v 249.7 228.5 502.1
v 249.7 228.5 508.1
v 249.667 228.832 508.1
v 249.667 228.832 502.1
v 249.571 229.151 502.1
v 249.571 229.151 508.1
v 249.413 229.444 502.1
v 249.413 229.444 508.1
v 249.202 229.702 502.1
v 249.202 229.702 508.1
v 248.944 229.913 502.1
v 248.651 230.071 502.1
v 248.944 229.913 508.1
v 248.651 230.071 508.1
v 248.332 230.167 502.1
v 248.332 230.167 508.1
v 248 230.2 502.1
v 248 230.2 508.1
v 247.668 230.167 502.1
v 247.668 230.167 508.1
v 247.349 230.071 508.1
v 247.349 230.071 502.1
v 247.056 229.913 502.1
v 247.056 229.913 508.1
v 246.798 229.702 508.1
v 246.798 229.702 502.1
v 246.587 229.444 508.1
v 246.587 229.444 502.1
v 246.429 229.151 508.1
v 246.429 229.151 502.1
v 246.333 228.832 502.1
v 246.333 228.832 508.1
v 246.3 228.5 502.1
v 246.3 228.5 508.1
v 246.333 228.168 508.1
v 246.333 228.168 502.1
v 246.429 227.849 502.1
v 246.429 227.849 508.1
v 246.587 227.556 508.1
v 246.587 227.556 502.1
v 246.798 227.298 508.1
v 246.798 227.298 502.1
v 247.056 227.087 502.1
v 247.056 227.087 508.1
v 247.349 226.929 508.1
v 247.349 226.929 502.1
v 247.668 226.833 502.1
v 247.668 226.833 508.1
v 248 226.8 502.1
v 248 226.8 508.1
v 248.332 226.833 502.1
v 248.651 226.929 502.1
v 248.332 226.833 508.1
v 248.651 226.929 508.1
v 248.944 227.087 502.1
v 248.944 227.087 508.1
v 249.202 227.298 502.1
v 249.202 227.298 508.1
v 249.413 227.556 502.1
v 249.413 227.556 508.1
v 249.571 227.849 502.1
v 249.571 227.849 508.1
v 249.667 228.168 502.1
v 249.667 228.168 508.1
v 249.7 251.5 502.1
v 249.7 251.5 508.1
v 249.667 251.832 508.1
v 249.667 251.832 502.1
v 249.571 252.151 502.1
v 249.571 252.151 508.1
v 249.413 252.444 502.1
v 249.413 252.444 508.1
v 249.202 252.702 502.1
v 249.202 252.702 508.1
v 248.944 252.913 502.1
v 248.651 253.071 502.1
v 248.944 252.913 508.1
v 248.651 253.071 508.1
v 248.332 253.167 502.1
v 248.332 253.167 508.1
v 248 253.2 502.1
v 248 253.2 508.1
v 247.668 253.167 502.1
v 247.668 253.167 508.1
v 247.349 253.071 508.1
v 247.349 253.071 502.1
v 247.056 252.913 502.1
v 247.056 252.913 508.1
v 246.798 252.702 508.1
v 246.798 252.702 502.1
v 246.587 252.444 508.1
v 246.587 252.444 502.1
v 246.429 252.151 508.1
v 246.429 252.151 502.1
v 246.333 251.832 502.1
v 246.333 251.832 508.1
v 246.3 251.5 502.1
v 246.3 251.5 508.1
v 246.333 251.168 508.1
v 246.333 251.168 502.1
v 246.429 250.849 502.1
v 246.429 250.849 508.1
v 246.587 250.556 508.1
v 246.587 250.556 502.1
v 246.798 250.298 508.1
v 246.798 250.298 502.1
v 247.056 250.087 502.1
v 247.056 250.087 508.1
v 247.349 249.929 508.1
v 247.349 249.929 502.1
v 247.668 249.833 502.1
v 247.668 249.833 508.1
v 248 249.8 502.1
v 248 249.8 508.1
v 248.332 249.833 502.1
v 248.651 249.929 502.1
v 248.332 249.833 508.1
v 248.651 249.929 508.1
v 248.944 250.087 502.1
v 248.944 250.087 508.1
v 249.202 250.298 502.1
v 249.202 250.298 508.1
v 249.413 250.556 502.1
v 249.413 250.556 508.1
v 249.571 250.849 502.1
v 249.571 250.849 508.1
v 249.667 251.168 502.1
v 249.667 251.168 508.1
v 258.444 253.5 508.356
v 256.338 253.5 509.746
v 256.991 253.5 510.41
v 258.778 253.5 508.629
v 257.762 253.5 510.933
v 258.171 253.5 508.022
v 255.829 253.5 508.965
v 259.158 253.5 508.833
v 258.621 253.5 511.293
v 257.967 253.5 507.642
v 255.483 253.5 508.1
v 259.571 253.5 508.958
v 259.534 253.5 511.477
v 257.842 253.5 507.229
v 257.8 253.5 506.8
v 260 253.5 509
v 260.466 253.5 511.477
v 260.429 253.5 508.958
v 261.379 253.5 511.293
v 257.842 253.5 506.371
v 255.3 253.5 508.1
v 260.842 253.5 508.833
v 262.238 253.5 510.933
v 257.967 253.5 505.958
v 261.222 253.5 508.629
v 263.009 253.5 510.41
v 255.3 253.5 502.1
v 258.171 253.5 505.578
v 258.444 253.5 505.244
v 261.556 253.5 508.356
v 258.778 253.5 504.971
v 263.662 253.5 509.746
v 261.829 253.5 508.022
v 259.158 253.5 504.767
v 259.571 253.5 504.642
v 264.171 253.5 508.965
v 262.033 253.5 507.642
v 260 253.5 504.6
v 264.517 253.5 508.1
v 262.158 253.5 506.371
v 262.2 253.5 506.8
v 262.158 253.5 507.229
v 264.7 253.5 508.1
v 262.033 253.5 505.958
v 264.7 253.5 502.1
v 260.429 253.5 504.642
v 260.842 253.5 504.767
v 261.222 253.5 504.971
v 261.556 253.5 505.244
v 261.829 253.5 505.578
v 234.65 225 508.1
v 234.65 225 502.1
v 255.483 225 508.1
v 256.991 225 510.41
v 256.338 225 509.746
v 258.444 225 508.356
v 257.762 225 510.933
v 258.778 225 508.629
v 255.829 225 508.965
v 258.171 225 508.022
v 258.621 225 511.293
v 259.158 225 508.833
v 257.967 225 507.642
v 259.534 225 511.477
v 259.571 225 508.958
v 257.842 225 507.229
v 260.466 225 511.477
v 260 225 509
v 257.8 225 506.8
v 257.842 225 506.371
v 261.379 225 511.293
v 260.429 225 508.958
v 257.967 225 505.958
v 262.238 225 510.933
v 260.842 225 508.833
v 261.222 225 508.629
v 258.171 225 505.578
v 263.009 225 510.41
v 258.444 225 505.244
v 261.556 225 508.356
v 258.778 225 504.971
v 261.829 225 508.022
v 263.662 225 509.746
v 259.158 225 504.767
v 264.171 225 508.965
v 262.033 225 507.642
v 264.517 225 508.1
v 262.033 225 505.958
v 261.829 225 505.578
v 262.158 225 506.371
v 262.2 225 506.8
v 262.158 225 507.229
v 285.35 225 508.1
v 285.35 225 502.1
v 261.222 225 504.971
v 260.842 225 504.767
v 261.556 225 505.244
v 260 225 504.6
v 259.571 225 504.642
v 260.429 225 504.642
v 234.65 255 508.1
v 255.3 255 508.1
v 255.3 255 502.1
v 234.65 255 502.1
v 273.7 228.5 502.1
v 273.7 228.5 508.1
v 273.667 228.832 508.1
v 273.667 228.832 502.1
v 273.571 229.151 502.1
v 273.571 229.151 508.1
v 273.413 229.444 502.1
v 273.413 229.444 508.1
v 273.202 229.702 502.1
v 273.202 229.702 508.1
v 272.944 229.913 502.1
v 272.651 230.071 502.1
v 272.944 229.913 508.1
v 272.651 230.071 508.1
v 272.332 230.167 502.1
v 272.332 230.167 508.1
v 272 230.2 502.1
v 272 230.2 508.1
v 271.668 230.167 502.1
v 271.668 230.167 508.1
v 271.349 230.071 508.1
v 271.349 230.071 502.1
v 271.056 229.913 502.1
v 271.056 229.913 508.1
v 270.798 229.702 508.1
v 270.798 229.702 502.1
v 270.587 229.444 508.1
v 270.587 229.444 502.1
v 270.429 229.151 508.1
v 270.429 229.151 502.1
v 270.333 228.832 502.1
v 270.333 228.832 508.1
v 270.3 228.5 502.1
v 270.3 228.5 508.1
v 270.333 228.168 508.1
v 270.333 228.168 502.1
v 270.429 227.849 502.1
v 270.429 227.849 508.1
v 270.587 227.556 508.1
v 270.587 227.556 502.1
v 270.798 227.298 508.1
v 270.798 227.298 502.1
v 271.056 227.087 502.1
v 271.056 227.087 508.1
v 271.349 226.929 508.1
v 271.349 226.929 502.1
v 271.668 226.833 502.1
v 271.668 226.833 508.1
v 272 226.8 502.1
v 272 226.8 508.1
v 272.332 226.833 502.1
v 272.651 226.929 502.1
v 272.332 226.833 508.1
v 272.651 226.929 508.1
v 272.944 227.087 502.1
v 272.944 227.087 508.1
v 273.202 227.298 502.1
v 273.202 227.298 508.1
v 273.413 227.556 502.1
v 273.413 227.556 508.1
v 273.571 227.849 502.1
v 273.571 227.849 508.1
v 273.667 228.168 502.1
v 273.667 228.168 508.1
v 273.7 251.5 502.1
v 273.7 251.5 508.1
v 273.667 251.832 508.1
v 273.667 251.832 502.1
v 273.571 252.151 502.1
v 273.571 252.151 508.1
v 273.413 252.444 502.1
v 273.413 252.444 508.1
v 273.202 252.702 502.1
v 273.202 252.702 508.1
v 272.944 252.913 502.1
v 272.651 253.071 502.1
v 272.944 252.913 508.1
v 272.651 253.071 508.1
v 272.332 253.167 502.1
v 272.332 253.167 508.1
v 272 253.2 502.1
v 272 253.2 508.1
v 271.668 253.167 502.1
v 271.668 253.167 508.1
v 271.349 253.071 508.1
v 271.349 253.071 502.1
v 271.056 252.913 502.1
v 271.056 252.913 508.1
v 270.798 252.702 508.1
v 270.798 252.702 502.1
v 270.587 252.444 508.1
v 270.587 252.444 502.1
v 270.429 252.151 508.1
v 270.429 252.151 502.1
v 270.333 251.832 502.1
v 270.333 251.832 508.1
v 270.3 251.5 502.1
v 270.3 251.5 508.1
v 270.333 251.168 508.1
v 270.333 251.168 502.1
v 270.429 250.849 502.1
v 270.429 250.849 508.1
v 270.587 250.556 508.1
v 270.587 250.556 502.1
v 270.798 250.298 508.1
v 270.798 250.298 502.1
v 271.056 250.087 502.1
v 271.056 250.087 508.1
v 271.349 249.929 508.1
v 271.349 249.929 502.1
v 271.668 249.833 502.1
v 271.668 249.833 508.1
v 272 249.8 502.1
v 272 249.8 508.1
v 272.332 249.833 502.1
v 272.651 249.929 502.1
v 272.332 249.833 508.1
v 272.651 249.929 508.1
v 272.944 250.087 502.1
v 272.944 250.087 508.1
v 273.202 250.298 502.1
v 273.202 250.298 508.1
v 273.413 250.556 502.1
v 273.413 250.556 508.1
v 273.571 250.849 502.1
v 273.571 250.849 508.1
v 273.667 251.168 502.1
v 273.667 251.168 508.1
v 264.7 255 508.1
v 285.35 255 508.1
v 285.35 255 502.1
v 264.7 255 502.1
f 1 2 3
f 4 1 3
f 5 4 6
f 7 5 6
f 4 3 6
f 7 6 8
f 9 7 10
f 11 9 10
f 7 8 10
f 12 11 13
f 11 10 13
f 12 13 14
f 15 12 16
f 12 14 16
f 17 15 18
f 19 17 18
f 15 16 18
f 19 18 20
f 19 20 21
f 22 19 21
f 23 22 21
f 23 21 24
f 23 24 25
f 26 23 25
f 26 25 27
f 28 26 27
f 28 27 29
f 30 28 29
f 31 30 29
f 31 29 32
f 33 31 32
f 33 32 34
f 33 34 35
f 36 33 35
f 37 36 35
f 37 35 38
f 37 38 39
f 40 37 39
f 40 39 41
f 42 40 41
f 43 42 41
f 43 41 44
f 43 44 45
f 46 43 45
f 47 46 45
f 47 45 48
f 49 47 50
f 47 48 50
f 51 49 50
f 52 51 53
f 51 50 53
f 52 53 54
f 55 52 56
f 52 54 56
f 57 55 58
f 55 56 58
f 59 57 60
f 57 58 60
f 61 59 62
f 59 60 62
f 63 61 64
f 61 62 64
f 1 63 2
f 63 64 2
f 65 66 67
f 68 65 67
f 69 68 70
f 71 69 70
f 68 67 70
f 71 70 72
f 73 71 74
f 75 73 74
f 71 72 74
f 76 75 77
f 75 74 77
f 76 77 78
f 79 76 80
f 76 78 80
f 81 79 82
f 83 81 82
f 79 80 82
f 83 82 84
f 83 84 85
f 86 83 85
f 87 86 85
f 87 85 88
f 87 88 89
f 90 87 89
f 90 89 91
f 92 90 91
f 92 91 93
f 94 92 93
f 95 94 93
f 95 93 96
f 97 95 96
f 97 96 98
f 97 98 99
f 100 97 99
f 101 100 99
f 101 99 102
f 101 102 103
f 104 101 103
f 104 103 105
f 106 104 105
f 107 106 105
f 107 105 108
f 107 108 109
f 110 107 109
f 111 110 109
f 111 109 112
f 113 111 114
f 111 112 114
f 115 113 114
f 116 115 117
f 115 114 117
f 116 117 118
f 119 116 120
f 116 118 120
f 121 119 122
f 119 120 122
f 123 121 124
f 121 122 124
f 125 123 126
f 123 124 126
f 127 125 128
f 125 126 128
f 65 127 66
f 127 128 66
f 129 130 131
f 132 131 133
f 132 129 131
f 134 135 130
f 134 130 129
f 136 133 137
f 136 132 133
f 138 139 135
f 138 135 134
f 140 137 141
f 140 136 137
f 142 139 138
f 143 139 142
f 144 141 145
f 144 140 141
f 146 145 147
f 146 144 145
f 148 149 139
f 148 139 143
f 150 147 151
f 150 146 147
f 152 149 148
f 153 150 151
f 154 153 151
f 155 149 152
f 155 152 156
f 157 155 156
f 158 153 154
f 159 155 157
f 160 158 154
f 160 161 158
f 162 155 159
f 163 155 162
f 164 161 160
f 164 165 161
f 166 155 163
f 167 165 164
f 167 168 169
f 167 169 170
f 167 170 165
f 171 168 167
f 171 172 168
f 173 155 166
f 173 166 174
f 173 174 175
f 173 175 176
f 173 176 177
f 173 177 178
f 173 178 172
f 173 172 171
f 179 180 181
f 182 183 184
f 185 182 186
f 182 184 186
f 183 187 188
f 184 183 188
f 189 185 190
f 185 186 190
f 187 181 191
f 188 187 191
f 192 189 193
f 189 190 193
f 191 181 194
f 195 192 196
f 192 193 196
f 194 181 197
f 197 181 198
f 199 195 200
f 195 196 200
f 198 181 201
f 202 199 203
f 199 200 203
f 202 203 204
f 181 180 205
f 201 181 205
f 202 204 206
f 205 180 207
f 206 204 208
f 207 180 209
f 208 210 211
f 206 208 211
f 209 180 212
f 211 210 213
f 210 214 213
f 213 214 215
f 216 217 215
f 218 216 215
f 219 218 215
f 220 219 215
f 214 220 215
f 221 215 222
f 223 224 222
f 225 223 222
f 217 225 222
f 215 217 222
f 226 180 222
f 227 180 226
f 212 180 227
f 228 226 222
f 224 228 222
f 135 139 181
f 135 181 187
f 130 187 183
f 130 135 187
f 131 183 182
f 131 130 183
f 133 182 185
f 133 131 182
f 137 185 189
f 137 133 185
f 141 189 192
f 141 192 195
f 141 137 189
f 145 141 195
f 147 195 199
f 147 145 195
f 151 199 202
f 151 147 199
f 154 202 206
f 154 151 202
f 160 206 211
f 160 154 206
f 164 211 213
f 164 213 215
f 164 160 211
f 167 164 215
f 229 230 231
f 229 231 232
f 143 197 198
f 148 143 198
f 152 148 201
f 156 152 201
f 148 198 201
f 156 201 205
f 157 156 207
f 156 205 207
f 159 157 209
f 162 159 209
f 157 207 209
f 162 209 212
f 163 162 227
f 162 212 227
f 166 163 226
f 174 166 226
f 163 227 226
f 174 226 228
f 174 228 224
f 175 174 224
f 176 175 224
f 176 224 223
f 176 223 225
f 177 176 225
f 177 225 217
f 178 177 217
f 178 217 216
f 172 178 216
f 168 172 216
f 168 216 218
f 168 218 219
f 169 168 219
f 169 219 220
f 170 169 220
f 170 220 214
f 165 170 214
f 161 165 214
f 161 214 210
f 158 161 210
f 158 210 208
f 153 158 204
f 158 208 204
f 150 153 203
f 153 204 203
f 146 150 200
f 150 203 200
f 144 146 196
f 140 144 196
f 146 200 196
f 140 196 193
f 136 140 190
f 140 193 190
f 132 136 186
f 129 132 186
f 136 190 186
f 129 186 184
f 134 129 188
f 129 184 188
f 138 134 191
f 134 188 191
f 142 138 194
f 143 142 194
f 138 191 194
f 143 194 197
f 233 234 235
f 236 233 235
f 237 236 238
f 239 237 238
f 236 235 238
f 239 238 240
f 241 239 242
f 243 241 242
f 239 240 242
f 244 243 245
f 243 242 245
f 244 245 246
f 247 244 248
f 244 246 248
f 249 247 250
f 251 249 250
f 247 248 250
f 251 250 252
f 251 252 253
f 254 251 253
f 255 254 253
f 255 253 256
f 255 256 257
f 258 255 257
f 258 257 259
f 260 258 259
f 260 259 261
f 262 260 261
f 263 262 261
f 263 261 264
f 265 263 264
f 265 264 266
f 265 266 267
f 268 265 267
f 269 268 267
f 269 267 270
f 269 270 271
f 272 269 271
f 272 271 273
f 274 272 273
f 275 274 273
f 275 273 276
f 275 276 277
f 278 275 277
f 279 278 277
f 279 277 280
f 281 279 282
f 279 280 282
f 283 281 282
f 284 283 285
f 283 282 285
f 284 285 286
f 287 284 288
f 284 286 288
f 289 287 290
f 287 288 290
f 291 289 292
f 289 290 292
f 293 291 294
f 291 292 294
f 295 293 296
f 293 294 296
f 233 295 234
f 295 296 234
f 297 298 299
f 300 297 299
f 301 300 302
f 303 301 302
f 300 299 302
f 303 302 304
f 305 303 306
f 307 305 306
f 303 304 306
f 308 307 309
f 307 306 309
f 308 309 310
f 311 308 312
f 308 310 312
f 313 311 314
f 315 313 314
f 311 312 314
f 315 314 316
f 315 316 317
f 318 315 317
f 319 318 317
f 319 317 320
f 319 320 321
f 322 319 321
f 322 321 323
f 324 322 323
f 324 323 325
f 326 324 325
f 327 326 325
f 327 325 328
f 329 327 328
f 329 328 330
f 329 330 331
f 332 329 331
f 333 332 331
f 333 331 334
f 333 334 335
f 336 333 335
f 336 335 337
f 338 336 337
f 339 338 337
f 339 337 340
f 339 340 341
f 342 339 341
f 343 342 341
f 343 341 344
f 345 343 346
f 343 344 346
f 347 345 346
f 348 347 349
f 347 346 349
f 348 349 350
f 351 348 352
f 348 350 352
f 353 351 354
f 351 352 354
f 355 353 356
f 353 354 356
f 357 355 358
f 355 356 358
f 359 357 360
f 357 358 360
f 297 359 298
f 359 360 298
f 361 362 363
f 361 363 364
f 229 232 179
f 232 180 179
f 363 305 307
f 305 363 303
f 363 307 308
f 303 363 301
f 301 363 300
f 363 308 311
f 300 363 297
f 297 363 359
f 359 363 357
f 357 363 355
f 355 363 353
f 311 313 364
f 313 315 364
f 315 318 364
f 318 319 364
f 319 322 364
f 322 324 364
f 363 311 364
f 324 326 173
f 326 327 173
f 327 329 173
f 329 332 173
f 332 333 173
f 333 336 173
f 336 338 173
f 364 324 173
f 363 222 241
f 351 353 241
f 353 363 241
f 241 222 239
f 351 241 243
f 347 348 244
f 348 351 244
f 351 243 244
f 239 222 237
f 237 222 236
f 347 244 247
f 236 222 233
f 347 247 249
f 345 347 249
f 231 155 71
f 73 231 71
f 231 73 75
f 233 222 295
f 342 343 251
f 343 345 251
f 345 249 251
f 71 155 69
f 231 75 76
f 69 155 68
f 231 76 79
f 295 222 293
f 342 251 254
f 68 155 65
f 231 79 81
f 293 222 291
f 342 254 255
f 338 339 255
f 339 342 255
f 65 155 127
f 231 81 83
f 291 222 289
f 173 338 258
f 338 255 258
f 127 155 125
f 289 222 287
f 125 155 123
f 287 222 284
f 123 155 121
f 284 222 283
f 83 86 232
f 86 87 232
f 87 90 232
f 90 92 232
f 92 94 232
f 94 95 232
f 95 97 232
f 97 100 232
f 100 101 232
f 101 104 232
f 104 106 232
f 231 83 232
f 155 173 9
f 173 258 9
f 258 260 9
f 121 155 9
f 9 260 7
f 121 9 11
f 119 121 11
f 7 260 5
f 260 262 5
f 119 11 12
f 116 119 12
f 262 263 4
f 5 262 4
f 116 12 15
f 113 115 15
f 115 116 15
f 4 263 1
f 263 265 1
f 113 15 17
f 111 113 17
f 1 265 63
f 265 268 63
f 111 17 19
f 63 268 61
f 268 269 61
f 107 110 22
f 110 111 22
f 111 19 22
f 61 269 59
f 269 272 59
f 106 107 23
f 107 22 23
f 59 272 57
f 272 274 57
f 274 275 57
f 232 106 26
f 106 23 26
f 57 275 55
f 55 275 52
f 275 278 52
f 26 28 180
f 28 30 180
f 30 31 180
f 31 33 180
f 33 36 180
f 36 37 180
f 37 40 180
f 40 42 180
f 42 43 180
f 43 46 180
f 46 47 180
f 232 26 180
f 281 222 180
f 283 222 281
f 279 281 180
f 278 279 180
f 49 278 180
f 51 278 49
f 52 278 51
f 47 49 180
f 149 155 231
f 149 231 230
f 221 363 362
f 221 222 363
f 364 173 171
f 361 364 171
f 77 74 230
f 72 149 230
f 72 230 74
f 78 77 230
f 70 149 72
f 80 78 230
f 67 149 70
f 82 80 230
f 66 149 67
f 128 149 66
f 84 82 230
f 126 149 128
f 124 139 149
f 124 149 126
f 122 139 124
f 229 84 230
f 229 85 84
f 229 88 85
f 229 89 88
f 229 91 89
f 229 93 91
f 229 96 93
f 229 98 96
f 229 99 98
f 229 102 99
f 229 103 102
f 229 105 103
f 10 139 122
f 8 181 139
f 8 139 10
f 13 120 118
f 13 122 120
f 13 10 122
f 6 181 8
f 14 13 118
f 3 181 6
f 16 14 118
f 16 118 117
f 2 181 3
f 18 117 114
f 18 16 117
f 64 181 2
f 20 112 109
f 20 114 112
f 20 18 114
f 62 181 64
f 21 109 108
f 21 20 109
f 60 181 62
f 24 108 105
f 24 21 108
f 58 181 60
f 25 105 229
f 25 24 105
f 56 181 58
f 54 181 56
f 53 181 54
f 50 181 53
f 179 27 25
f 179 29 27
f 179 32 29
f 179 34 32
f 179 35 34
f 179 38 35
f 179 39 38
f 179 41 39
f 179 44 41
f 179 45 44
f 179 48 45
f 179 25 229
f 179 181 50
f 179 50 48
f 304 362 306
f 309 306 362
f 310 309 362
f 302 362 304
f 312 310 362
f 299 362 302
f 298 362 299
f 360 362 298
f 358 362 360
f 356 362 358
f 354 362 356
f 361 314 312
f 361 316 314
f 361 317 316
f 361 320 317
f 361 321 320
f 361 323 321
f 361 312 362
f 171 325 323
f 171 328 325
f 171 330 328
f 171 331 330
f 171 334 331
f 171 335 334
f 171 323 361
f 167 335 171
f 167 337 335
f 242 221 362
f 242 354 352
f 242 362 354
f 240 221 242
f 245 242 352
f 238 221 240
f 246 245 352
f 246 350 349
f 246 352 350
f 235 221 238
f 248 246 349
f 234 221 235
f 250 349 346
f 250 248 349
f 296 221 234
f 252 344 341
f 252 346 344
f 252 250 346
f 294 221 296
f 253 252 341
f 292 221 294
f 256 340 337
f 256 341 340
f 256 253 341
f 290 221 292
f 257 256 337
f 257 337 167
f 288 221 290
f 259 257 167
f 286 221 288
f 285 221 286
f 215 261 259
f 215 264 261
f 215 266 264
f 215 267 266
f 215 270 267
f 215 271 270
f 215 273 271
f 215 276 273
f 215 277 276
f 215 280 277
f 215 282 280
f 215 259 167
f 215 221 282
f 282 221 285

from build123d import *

# Parameters (mm, degrees)
EXTRUDE_1_DEPTH             = 28.5
SKETCH_2_W                  = 20.65
SKETCH_2_H                  = 6
EXTRUDE_2_DEPTH             = 1.5
SKETCH_3_W                  = 20.65
SKETCH_3_H                  = 6
EXTRUDE_3_DEPTH             = 1.5
HOLE_WIZARD_4_4_4_4_1_D     = 4.4
HOLE_WIZARD_4_4_4_4_1_DEPTH = 28.5
HOLE_WIZARD_3_4_3_4_1_D     = 3.4
HOLE_WIZARD_3_4_3_4_1_DEPTH = 9.4


with BuildPart() as part:
    # 草图1 → 凸台-拉伸1 (new body)
    with BuildSketch(Plane(origin=(0, 253.5, 0), x_dir=(1, 0, 0), z_dir=(0, 1, 0))):
        with BuildLine():
            Line((264.516635916, -508.1), (285.35, -508.1))
            Line((285.35, -508.1), (285.35, -502.1))
            Line((285.35, -502.1), (234.65, -502.1))
            Line((234.65, -502.1), (234.65, -508.1))
            Line((234.65, -508.1), (255.483364084, -508.1))
            ThreePointArc((255.483364084, -508.1), (260, -511.5), (264.516635916, -508.1))
        make_face()
    extrude(amount=-EXTRUDE_1_DEPTH)

    # 草图2 → 凸台-拉伸2 (add)
    with BuildSketch(Plane(origin=(0, 253.5, 0), x_dir=(-1, 0, 0), z_dir=(0, 1, 0))):
        with Locations((-275.025, 505.1)):
            Rectangle(SKETCH_2_W, SKETCH_2_H)
    extrude(amount=EXTRUDE_2_DEPTH)

    # 草图3 → 凸台-拉伸3 (add)
    with BuildSketch(Plane(origin=(0, 253.5, 0), x_dir=(-1, 0, 0), z_dir=(0, 1, 0))):
        with Locations((-244.975, 505.1)):
            Rectangle(SKETCH_3_W, SKETCH_3_H)
    extrude(amount=EXTRUDE_3_DEPTH)

    # Ø4.4 (4.4) 直径孔1
    with Locations(Plane(origin=(0, 253.5, 0), x_dir=(1, 0, 0), z_dir=(0, 1, 0))):
        with Locations((260, -506.8)):
            Hole(HOLE_WIZARD_4_4_4_4_1_D / 2, depth=HOLE_WIZARD_4_4_4_4_1_DEPTH)

    # Ø3.4 (3.4) 直径孔1
    with Locations(Plane(origin=(0, 0, 502.1), x_dir=(-1, 0, 0), z_dir=(0, 0, -1))):
        with Locations((-248, 228.5), (-248, 251.5), (-272, 251.5), (-272, 228.5)):
            Hole(HOLE_WIZARD_3_4_3_4_1_D / 2, depth=HOLE_WIZARD_3_4_3_4_1_DEPTH)


solid = part.part
